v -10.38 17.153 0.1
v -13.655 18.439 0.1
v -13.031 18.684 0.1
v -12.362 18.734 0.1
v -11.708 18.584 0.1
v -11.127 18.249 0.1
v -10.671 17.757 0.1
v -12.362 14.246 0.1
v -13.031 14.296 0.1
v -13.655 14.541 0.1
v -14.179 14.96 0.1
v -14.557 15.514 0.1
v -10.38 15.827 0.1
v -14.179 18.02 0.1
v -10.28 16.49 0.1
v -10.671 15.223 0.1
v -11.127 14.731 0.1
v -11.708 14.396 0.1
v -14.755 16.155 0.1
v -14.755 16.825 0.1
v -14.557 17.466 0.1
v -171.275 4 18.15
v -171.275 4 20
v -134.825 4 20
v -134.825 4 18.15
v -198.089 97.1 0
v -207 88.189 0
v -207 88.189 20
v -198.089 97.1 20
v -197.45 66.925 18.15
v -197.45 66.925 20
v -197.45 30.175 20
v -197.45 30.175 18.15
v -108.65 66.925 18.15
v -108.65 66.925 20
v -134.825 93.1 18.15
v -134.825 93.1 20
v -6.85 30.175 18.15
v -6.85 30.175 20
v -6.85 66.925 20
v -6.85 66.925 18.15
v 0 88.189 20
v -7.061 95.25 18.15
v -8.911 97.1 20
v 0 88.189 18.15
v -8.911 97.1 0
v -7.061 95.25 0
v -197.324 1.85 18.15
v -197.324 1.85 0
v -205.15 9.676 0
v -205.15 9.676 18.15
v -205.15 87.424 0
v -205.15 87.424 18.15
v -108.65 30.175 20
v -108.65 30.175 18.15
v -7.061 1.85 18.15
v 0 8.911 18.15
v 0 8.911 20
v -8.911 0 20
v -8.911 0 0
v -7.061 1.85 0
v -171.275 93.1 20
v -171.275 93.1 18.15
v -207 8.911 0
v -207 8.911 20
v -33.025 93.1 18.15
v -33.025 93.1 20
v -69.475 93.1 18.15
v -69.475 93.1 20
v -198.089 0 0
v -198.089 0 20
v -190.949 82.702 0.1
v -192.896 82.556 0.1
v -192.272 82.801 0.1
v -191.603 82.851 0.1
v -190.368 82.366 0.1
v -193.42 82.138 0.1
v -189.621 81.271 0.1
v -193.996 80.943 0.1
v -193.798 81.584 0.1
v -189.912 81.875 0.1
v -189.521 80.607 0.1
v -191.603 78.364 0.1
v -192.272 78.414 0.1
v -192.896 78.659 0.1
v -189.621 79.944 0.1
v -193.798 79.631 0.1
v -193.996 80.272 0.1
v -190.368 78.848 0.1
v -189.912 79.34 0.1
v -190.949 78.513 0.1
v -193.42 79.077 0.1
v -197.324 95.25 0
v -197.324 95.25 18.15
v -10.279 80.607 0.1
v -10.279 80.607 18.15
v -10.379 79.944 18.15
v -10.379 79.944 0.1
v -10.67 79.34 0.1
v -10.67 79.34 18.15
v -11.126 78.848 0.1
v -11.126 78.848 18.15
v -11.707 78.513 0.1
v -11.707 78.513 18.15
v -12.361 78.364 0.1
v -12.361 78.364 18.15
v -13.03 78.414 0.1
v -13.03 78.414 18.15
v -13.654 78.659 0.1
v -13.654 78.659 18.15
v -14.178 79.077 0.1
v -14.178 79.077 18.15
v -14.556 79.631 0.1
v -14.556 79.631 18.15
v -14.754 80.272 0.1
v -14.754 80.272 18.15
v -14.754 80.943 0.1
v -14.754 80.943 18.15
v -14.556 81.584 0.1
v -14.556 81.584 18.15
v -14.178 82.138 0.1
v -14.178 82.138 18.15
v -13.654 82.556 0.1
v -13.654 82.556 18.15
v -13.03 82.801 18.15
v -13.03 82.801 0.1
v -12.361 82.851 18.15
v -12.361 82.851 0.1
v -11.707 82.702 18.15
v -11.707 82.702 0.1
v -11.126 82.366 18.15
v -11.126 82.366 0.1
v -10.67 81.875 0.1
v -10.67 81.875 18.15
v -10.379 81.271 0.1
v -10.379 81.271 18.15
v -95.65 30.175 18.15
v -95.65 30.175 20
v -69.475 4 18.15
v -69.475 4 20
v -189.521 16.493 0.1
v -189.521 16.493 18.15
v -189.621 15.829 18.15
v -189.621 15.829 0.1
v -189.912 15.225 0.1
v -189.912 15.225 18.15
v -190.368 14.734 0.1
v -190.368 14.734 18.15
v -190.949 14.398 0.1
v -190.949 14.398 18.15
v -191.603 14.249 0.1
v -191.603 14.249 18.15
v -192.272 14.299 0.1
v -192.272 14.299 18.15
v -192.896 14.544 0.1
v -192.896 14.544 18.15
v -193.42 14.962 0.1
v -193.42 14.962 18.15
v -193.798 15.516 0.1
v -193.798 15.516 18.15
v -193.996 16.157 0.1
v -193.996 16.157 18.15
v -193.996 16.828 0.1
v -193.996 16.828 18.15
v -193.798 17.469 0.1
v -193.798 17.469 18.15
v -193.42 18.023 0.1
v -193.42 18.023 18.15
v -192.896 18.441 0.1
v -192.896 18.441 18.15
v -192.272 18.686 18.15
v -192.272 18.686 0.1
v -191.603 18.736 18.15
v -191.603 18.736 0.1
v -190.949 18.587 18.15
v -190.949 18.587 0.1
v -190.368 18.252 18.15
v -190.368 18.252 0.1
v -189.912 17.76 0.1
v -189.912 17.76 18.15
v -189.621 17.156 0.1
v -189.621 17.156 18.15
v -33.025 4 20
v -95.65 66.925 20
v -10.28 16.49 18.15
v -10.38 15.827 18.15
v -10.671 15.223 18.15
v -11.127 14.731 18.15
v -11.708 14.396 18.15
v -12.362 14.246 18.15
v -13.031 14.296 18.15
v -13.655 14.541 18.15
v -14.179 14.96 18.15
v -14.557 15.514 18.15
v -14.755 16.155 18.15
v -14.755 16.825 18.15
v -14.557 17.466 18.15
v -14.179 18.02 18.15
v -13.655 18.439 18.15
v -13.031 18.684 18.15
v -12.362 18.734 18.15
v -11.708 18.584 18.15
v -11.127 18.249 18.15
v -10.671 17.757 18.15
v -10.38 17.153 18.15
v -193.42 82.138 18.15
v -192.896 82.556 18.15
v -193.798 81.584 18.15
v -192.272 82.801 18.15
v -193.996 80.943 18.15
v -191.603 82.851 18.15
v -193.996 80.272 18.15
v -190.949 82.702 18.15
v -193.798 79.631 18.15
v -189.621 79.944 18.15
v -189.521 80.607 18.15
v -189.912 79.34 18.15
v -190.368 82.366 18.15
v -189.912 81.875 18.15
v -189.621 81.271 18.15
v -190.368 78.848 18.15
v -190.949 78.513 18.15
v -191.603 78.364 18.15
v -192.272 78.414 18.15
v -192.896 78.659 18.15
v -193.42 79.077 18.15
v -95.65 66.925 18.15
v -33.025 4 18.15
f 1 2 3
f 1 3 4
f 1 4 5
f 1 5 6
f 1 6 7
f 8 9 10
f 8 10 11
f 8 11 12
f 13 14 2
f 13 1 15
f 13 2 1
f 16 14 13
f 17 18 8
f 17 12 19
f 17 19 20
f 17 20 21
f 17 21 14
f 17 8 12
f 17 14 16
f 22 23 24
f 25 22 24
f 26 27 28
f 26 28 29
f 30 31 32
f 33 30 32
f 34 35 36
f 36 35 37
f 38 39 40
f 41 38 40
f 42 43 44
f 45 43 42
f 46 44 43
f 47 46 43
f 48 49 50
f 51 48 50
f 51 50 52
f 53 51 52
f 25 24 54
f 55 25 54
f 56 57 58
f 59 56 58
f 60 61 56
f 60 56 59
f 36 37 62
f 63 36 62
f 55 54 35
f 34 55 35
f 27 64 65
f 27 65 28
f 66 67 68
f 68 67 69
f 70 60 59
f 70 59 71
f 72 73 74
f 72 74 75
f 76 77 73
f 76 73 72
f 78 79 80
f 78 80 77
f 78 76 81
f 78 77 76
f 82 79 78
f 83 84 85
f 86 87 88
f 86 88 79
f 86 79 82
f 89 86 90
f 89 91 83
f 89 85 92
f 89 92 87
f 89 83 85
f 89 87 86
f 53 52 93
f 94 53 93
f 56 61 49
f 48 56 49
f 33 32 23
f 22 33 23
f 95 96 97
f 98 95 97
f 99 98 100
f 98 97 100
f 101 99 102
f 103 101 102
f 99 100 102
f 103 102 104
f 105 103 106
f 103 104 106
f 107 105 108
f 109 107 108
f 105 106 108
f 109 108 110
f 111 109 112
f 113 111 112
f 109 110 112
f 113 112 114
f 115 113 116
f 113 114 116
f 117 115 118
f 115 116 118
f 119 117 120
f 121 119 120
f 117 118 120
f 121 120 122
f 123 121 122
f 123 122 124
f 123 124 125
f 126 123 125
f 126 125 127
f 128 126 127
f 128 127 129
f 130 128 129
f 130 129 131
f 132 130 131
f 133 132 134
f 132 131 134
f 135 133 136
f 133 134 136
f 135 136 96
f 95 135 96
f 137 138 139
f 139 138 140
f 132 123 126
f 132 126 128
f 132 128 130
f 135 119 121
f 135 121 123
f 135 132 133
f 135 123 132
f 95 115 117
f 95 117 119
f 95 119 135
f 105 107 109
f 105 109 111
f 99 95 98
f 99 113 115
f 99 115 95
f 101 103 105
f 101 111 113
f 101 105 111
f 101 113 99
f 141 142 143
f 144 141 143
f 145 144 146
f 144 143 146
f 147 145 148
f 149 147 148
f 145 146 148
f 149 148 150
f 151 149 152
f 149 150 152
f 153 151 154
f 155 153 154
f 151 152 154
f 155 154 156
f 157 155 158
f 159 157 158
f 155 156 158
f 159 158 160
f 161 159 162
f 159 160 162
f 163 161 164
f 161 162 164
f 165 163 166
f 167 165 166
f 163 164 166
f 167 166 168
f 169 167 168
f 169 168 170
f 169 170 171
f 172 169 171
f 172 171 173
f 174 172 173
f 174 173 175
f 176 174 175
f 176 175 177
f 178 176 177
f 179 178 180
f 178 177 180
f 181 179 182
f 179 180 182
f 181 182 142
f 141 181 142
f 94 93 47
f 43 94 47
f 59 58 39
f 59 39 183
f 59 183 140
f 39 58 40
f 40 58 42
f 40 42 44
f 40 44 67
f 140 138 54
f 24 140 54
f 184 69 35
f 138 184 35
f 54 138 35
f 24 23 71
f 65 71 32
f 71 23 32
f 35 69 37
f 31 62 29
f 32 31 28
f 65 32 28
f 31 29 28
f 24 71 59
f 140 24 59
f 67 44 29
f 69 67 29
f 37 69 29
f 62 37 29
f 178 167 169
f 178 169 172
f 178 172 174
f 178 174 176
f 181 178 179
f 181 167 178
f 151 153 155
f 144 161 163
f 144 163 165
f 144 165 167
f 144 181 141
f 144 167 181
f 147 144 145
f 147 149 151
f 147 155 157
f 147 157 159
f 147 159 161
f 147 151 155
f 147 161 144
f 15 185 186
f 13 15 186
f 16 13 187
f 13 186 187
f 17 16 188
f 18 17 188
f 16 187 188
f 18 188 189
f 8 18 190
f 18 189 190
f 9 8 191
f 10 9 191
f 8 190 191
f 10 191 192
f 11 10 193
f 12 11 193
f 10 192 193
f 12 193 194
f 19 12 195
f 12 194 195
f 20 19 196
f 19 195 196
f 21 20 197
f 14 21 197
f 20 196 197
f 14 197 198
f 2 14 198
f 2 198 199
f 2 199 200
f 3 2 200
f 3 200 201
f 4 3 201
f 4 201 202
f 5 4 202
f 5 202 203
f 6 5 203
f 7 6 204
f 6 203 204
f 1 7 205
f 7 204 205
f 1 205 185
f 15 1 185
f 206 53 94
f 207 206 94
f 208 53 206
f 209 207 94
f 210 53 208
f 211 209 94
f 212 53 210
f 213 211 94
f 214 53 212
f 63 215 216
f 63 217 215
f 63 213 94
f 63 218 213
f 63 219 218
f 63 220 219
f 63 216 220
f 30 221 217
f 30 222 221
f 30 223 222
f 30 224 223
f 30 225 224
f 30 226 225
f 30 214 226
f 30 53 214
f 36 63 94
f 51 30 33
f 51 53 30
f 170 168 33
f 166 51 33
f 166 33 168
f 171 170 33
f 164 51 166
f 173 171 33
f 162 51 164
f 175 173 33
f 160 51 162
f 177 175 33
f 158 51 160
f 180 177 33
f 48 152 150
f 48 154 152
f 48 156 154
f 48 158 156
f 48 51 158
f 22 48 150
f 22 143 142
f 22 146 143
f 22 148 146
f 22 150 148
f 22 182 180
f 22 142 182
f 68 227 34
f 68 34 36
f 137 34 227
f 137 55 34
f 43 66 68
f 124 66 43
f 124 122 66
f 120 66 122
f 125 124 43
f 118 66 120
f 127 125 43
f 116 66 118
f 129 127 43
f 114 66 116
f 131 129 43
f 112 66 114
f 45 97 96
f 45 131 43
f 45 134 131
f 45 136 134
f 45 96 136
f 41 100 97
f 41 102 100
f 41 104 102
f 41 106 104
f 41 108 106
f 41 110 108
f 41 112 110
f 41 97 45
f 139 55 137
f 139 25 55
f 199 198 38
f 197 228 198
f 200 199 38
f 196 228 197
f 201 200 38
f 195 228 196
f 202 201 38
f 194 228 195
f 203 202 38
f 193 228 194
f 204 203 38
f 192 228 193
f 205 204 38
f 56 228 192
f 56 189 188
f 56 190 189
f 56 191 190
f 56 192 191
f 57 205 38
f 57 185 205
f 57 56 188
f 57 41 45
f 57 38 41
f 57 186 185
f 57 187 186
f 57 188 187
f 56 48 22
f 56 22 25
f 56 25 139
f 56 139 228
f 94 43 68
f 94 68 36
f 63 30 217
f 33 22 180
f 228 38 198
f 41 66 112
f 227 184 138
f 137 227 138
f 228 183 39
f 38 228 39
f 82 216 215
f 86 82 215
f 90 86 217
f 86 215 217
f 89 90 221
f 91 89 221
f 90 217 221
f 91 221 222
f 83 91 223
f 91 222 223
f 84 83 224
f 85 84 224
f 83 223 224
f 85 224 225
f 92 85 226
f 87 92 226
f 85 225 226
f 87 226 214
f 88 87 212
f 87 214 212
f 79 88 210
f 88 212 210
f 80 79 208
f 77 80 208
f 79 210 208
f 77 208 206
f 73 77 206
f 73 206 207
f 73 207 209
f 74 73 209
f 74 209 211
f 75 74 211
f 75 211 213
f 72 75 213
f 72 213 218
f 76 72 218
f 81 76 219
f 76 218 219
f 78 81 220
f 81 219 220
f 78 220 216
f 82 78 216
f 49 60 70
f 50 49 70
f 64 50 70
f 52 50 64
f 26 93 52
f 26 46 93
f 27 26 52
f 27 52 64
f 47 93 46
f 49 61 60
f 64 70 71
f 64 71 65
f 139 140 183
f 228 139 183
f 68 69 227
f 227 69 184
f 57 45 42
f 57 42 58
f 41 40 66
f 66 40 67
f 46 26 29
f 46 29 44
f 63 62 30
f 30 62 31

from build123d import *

# Parameters (mm, degrees)
PAD_DEPTH       = 20
POCKET_DEPTH    = 20
POCKET001_DEPTH = 18.15
SKETCH003_R     = 2.25
PAD001_DEPTH    = 18.05


with BuildPart() as part:
    # Sketch → Pad (new body)
    with BuildSketch(Plane.XY):
        Polygon((-8.910891, 97.1), (0, 88.189109), (0, 8.910891), (-8.910891, 0), (-198.089109, 0), (-207, 8.910891), (-207, 88.189109), (-198.089109, 97.1), align=None)
    extrude(amount=PAD_DEPTH)

    # Sketch001 (on Face10 of Pad) → Pocket (cut)
    with BuildSketch(Plane.XY.offset(20)):
        Polygon((-95.65, 66.925), (-95.65, 30.175), (-69.475, 4), (-33.025, 4), (-6.85, 30.175), (-6.85, 66.925), (-33.025, 93.1), (-69.475, 93.1), align=None)
        Polygon((-197.45, 66.925), (-197.45, 30.175), (-171.275, 4), (-134.825, 4), (-108.65, 30.175), (-108.65, 66.925), (-134.825, 93.1), (-171.275, 93.1), align=None)
    extrude(amount=-POCKET_DEPTH, mode=Mode.SUBTRACT)

    # Sketch002 (on Face4 of Pocket) → Pocket001 (cut)
    with BuildSketch(Plane(origin=(0, 0, 0), x_dir=(1, 0, 0), z_dir=(0, 0, -1))):
        Polygon((-197.323705, -1.85), (-205.15, -9.676295), (-205.15, -87.423705), (-197.323705, -95.25), (7.29, -95.25), (7.29, -1.85), align=None)
    extrude(amount=-POCKET001_DEPTH, mode=Mode.SUBTRACT)

    # Sketch003 (on Face32 of Pocket001) → Pad001 (join)
    with BuildSketch(Plane(origin=(0, 0, 18.15), x_dir=(1, 0, 0), z_dir=(0, 0, -1))):
        with Locations((-12.53, -16.49)):
            Circle(SKETCH003_R)
        with Locations((-191.771101, -16.492657)):
            Circle(SKETCH003_R)
        with Locations((-12.528899, -80.607343)):
            Circle(SKETCH003_R)
        with Locations((-191.771101, -80.607343)):
            Circle(SKETCH003_R)
    extrude(amount=PAD001_DEPTH)


solid = part.part
